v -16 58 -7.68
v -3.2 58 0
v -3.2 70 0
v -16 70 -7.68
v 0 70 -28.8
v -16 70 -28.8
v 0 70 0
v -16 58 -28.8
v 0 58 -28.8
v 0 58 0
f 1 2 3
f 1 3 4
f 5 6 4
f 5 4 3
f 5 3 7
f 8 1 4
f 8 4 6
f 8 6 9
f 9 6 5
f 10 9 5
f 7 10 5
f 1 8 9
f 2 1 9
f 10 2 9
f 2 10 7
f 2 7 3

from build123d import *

# Parameters (mm, degrees)
SKETCH021_W     = 16
SKETCH021_H     = 16
PAD012_DEPTH    = 28.8
POCKET009_DEPTH = 16
PAD139_DEPTH    = 16
SKETCH192_W     = 16
SKETCH192_H     = 2
POCKET074_DEPTH = 30


with BuildPart() as part:
    # Sketch021 (on Face60 of Binder008) → Pad012 (new body)
    with BuildSketch(Plane.XY.offset(-28.8)):
        with Locations((-8, 64)):
            Rectangle(SKETCH021_W, SKETCH021_H)
    extrude(amount=PAD012_DEPTH)

    # Sketch022 (on Face3 of Pad012) → Pocket009 (cut)
    with BuildSketch(Plane.XZ.offset(-56)):
        Polygon((-16, -9.6), (0, 0), (-16, 0), align=None)
    extrude(amount=-POCKET009_DEPTH, mode=Mode.SUBTRACT)

    # Sketch139 (on Face6 of Pocket009) → Pad139 (join)
    with BuildSketch(Plane.XZ.offset(-56)):
        Polygon((0, 0), (-3.2, 0), (-16, -7.68), (-16, -10.88), (-3.2, -3.2), (0, -3.2), align=None)
    extrude(amount=-PAD139_DEPTH)

    # Sketch192 (on Face1 of Pad139) → Pocket074 (cut)
    with BuildSketch(Plane(origin=(0, 0, -28.8), x_dir=(1, 0, 0), z_dir=(0, 0, -1))):
        with Locations((-8, -57)):
            Rectangle(SKETCH192_W, SKETCH192_H)
        with Locations((-8, -71)):
            Rectangle(SKETCH192_W, SKETCH192_H)
    extrude(amount=-POCKET074_DEPTH, mode=Mode.SUBTRACT)


solid = part.part
